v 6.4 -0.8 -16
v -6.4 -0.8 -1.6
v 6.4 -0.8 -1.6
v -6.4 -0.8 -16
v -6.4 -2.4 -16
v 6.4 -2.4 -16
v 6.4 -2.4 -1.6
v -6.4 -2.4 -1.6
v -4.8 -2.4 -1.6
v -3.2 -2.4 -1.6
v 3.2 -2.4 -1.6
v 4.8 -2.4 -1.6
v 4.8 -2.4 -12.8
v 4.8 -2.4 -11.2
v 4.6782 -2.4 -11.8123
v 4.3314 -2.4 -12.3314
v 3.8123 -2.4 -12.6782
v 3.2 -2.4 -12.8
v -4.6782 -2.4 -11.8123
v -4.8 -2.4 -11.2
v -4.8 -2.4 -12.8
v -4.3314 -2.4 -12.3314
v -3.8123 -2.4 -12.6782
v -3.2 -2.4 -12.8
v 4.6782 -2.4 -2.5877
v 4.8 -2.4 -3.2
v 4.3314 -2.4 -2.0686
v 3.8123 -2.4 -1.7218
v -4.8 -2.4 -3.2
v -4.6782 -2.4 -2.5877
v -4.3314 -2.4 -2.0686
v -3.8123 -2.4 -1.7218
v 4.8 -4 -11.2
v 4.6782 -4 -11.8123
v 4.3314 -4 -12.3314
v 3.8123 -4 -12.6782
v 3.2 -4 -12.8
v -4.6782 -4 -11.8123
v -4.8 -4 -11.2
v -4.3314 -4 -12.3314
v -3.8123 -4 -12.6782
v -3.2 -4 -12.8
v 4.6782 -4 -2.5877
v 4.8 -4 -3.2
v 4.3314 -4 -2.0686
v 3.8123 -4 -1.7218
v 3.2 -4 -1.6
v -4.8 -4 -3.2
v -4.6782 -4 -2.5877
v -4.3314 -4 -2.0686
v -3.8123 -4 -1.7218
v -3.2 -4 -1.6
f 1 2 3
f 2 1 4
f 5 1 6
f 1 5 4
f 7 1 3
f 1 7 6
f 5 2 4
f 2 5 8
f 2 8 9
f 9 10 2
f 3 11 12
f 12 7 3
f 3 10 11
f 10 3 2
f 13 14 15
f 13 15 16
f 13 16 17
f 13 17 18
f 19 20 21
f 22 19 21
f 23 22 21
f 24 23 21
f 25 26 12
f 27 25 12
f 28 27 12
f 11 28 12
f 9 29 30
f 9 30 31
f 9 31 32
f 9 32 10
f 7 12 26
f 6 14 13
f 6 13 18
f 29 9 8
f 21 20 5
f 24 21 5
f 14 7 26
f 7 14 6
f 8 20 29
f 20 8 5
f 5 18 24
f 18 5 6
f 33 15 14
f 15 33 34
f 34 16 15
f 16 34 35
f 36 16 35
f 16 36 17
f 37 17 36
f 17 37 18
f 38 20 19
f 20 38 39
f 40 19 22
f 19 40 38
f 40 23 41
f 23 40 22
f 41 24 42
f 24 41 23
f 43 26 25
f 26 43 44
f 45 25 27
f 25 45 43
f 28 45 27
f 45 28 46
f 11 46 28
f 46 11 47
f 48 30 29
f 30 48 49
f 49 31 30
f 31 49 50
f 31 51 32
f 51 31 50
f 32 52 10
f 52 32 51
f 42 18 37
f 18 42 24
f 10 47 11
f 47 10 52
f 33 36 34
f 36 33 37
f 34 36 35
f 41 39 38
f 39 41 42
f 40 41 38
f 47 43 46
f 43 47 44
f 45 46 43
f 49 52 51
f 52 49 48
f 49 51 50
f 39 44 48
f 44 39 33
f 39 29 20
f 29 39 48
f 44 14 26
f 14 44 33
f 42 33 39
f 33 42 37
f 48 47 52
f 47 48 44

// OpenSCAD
// file: ../p/1-4edge.scad
use <../lib.scad>
function ldraw_lib__1_4edge() = [
// 0 Circle 0.25
// 0 Name: 1-4edge.dat
// 0 Author: James Jessiman
// 0 !LDRAW_ORG Primitive UPDATE 2017-01
// 0 !LICENSE Licensed under CC BY 4.0 : see CAreadme.txt
// 
// 0 BFC CERTIFY CCW
  [0,"BFC","CERTIFY"],
  [0,"BFC","CCW"],
// 
// 0 !HISTORY 2007-06-22 [PTadmin] Header formatted for Contributor Agreement
// 0 !HISTORY 2008-07-01 [PTadmin] Official Update 2008-01
// 0 !HISTORY 2017-01-15 [Steffen] BFCed
// 0 !HISTORY 2017-12-30 [PTadmin] Official Update 2017-01
// 
// 
// 2 24 1 0 0 0.9239 0 0.3827
  [2,24,1,0,0,0.9239,0,0.3827],
// 2 24 0.9239 0 0.3827 0.7071 0 0.7071
  [2,24,0.9239,0,0.3827,0.7071,0,0.7071],
// 2 24 0.7071 0 0.7071 0.3827 0 0.9239
  [2,24,0.7071,0,0.7071,0.3827,0,0.9239],
// 2 24 0.3827 0 0.9239 0 0 1
  [2,24,0.3827,0,0.9239,0,0,1],
];
module ldraw_lib__1_4edge(step=0, col=false, unit=2/5, alt=false, line=0.2, solid=!$preview)
    makepoly(ldraw_lib__1_4edge(), step=step, col=col, unit=unit, alt=alt, line=line, solid=solid);
ldraw_lib__1_4edge(line=0.2);
// file: ../p/1-4cyli.scad
use <../lib.scad>
function ldraw_lib__1_4cyli() = [
// 0 Cylinder 0.25
// 0 Name: 1-4cyli.dat
// 0 Author: James Jessiman
// 0 !LDRAW_ORG Primitive UPDATE 2012-01
// 0 !LICENSE Licensed under CC BY 4.0 : see CAreadme.txt
// 
// 0 BFC CERTIFY CCW
  [0,"BFC","CERTIFY"],
  [0,"BFC","CCW"],
// 
// 0 !HISTORY 2002-03-23 [sbliss] Added BFC statement.
// 0 !HISTORY 2002-04-25 [PTadmin] Official Update 2002-02
// 0 !HISTORY 2007-06-22 [PTadmin] Header formatted for Contributor Agreement
// 0 !HISTORY 2008-07-01 [PTadmin] Official Update 2008-01
// 0 !HISTORY 2012-02-16 [Philo] Changed to CCW
// 0 !HISTORY 2012-03-30 [PTadmin] Official Update 2012-01
// 
// 
// 4 16 1 1 0 0.9239 1 0.3827 0.9239 0 0.3827 1 0 0
  [4,16,1,1,0,0.9239,1,0.3827,0.9239,0,0.3827,1,0,0],
// 5 24 1 0 0 1 1 0 0.9239 0 0.3827 1 0 -1
  [5,24,1,0,0,1,1,0,0.9239,0,0.3827,1,0,-1],
// 4 16 0.9239 1 0.3827 0.7071 1 0.7071 0.7071 0 0.7071 0.9239 0 0.3827
  [4,16,0.9239,1,0.3827,0.7071,1,0.7071,0.7071,0,0.7071,0.9239,0,0.3827],
// 5 24 0.9239 0 0.3827 0.9239 1 0.3827 0.7071 0 0.7071 1 0 0
  [5,24,0.9239,0,0.3827,0.9239,1,0.3827,0.7071,0,0.7071,1,0,0],
// 4 16 0.7071 1 0.7071 0.3827 1 0.9239 0.3827 0 0.9239 0.7071 0 0.7071
  [4,16,0.7071,1,0.7071,0.3827,1,0.9239,0.3827,0,0.9239,0.7071,0,0.7071],
// 5 24 0.7071 0 0.7071 0.7071 1 0.7071 0.3827 0 0.9239 0.9239 0 0.3827
  [5,24,0.7071,0,0.7071,0.7071,1,0.7071,0.3827,0,0.9239,0.9239,0,0.3827],
// 4 16 0.3827 1 0.9239 0 1 1 0 0 1 0.3827 0 0.9239
  [4,16,0.3827,1,0.9239,0,1,1,0,0,1,0.3827,0,0.9239],
// 5 24 0.3827 0 0.9239 0.3827 1 0.9239 0 0 1 0.7071 0 0.7071
  [5,24,0.3827,0,0.9239,0.3827,1,0.9239,0,0,1,0.7071,0,0.7071],
// 5 24 0 0 1 0 1 1 0.3827 0 0.9239 -1 0 1
  [5,24,0,0,1,0,1,1,0.3827,0,0.9239,-1,0,1],
];
module ldraw_lib__1_4cyli(step=0, col=false, unit=2/5, alt=false, line=0.2, solid=!$preview)
    makepoly(ldraw_lib__1_4cyli(), step=step, col=col, unit=unit, alt=alt, line=line, solid=solid);
ldraw_lib__1_4cyli(line=0.2);
// file: ../p/rect2p.scad
use <../lib.scad>
function ldraw_lib__rect2p() = [
// 0 Rectangle with 2 Parallel Edges
// 0 Name: rect2p.dat
// 0 Author: Donald Sutter [technog]
// 0 !LDRAW_ORG Primitive UPDATE 2010-01
// 0 !LICENSE Licensed under CC BY 4.0 : see CAreadme.txt
// 
// 0 BFC CERTIFY CCW
  [0,"BFC","CERTIFY"],
  [0,"BFC","CCW"],
// 
// 0 !HISTORY 2003-08-01 [PTadmin] Official Update 2003-02
// 0 !HISTORY 2007-06-24 [PTadmin] Header formatted for Contributor Agreement
// 0 !HISTORY 2008-07-01 [PTadmin] Official Update 2008-01
// 0 !HISTORY 2010-01-17 [mikeheide] changed winding to CCW
// 0 !HISTORY 2010-04-05 [PTadmin] Official Update 2010-01
// 
// 
// 2 24 1 0 1 -1 0 1
  [2,24,1,0,1,-1,0,1],
// 2 24 -1 0 -1 1 0 -1
  [2,24,-1,0,-1,1,0,-1],
// 4 16 -1 0 1 -1 0 -1 1 0 -1 1 0 1
  [4,16,-1,0,1,-1,0,-1,1,0,-1,1,0,1],
// 0
];
module ldraw_lib__rect2p(step=0, col=false, unit=2/5, alt=false, line=0.2, solid=!$preview)
    makepoly(ldraw_lib__rect2p(), step=step, col=col, unit=unit, alt=alt, line=line, solid=solid);
ldraw_lib__rect2p(line=0.2);
// file: ../p/rect1.scad
use <../lib.scad>
function ldraw_lib__rect1() = [
// 0 Rectangle with 1 Edge
// 0 Name: rect1.dat
// 0 Author: Chris Dee [cwdee]
// 0 !LDRAW_ORG Primitive UPDATE 2010-01
// 0 !LICENSE Licensed under CC BY 4.0 : see CAreadme.txt
// 
// 0 BFC CERTIFY CCW
  [0,"BFC","CERTIFY"],
  [0,"BFC","CCW"],
// 
// 0 !HISTORY 2003-12-19 [PTadmin] Official Update 2003-03
// 0 !HISTORY 2007-06-24 [PTadmin] Header formatted for Contributor Agreement
// 0 !HISTORY 2008-07-01 [PTadmin] Official Update 2008-01
// 0 !HISTORY 2010-01-17 [mikeheide] changed winding to CCW
// 0 !HISTORY 2010-04-05 [PTadmin] Official Update 2010-01
// 
// 
// 2 24 1 0 -1 1 0 1
  [2,24,1,0,-1,1,0,1],
// 4 16 -1 0 1 -1 0 -1 1 0 -1 1 0 1
  [4,16,-1,0,1,-1,0,-1,1,0,-1,1,0,1],
// 0
];
module ldraw_lib__rect1(step=0, col=false, unit=2/5, alt=false, line=0.2, solid=!$preview)
    makepoly(ldraw_lib__rect1(), step=step, col=col, unit=unit, alt=alt, line=line, solid=solid);
ldraw_lib__rect1(line=0.2);
// file: ../p/box4-1.scad
use <../lib.scad>
function ldraw_lib__box4_1() = [
// 0 Box with 4 Faces without 1 Edge
// 0 Name: box4-1.dat
// 0 Author: Tore Eriksson [Tore_Eriksson]
// 0 !LDRAW_ORG Primitive UPDATE 2012-01
// 0 !LICENSE Licensed under CC BY 2.0 and CC BY 4.0 : see CAreadme.txt
// 
// 0 BFC CERTIFY CCW
  [0,"BFC","CERTIFY"],
  [0,"BFC","CCW"],
// 
// 0 !HISTORY 1998-07-15 [PTadmin] Official Update 1998-07
// 0 !HISTORY 2002-04-05 [hafhead] Made BFC compliant
// 0 !HISTORY 2002-04-25 [PTadmin] Official Update 2002-02
// 0 !HISTORY 2007-06-24 [PTadmin] Header formatted for Contributor Agreement
// 0 !HISTORY 2008-07-01 [PTadmin] Official Update 2008-01
// 0 !HISTORY 2012-02-16 [Philo] Changed to CCW
// 0 !HISTORY 2012-03-30 [PTadmin] Official Update 2012-01
// 
// 
// 2 24 1 1 1 -1 1 1
  [2,24,1,1,1,-1,1,1],
// 2 24 -1 1 1 -1 1 -1
  [2,24,-1,1,1,-1,1,-1],
// 2 24 -1 1 -1 1 1 -1
  [2,24,-1,1,-1,1,1,-1],
// 2 24 1 1 -1 1 1 1
  [2,24,1,1,-1,1,1,1],
// 2 24 1 0 1 -1 0 1
  [2,24,1,0,1,-1,0,1],
// 2 24 -1 0 1 -1 0 -1
  [2,24,-1,0,1,-1,0,-1],
// 2 24 1 0 -1 1 0 1
  [2,24,1,0,-1,1,0,1],
// 2 24 1 0 1 1 1 1
  [2,24,1,0,1,1,1,1],
// 2 24 -1 0 1 -1 1 1
  [2,24,-1,0,1,-1,1,1],
// 2 24 1 0 -1 1 1 -1
  [2,24,1,0,-1,1,1,-1],
// 2 24 -1 0 -1 -1 1 -1
  [2,24,-1,0,-1,-1,1,-1],
// 4 16 -1 1 1 1 1 1 1 1 -1 -1 1 -1
  [4,16,-1,1,1,1,1,1,1,1,-1,-1,1,-1],
// 4 16 -1 1 1 -1 0 1 1 0 1 1 1 1
  [4,16,-1,1,1,-1,0,1,1,0,1,1,1,1],
// 4 16 -1 1 -1 -1 0 -1 -1 0 1 -1 1 1
  [4,16,-1,1,-1,-1,0,-1,-1,0,1,-1,1,1],
// 4 16 1 1 1 1 0 1 1 0 -1 1 1 -1
  [4,16,1,1,1,1,0,1,1,0,-1,1,1,-1],
];
module ldraw_lib__box4_1(step=0, col=false, unit=2/5, alt=false, line=0.2, solid=!$preview)
    makepoly(ldraw_lib__box4_1(), step=step, col=col, unit=unit, alt=alt, line=line, solid=solid);
ldraw_lib__box4_1(line=0.2);
// file: ../p/box3u8p.scad
use <../lib.scad>
function ldraw_lib__box3u8p() = [
// 0 Box with 3 Faces and 4 Parallel Edges
// 0 Name: box3u8p.dat
// 0 Author: James Jessiman
// 0 !LDRAW_ORG Primitive UPDATE 2012-01
// 0 !LICENSE Licensed under CC BY 2.0 and CC BY 4.0 : see CAreadme.txt
// 
// 0 BFC CERTIFY CCW
  [0,"BFC","CERTIFY"],
  [0,"BFC","CCW"],
// 
// 0 !HISTORY 2002-12-13 [hafhead] Made BFC compliant
// 0 !HISTORY 2003-08-01 [PTadmin] Official Update 2003-02
// 0 !HISTORY 2007-06-24 [PTadmin] Header formatted for Contributor Agreement
// 0 !HISTORY 2008-07-01 [PTadmin] Official Update 2008-01
// 0 !HISTORY 2012-02-16 [Philo] Changed to CCW
// 0 !HISTORY 2012-03-30 [PTadmin] Official Update 2012-01
// 
// 
// 2 24 1 1 1 -1 1 1
  [2,24,1,1,1,-1,1,1],
// 2 24 -1 1 -1 1 1 -1
  [2,24,-1,1,-1,1,1,-1],
// 2 24 1 0 1 -1 0 1
  [2,24,1,0,1,-1,0,1],
// 2 24 -1 0 -1 1 0 -1
  [2,24,-1,0,-1,1,0,-1],
// 4 16 1 1 -1 -1 1 -1 -1 1 1 1 1 1
  [4,16,1,1,-1,-1,1,-1,-1,1,1,1,1,1],
// 4 16 -1 1 1 -1 0 1 1 0 1 1 1 1
  [4,16,-1,1,1,-1,0,1,1,0,1,1,1,1],
// 4 16 1 1 -1 1 0 -1 -1 0 -1 -1 1 -1
  [4,16,1,1,-1,1,0,-1,-1,0,-1,-1,1,-1],
];
module ldraw_lib__box3u8p(step=0, col=false, unit=2/5, alt=false, line=0.2, solid=!$preview)
    makepoly(ldraw_lib__box3u8p(), step=step, col=col, unit=unit, alt=alt, line=line, solid=solid);
ldraw_lib__box3u8p(line=0.2);
// file: ../p/1-4ndis.scad
use <../lib.scad>
function ldraw_lib__1_4ndis() = [
// 0 Disc Negative 0.25
// 0 Name: 1-4ndis.dat
// 0 Author: James Jessiman
// 0 !LDRAW_ORG Primitive UPDATE 2012-01
// 0 !LICENSE Licensed under CC BY 4.0 : see CAreadme.txt
// 
// 0 BFC CERTIFY CCW
  [0,"BFC","CERTIFY"],
  [0,"BFC","CCW"],
// 
// 0 !HISTORY 2002-03-23 [sbliss] Added BFC Statement
// 0 !HISTORY 2002-04-25 [PTadmin] Official Update 2002-02
// 0 !HISTORY 2007-06-22 [PTadmin] Header formatted for Contributor Agreement
// 0 !HISTORY 2008-07-01 [PTadmin] Official Update 2008-01
// 0 !HISTORY 2012-02-16 [Philo] Changed to CCW
// 0 !HISTORY 2012-03-30 [PTadmin] Official Update 2012-01
// 
// 
// 3 16 0.9239 0 0.3827 1 0 0 1 0 1
  [3,16,0.9239,0,0.3827,1,0,0,1,0,1],
// 3 16 0.7071 0 0.7071 0.9239 0 0.3827 1 0 1
  [3,16,0.7071,0,0.7071,0.9239,0,0.3827,1,0,1],
// 3 16 0.3827 0 0.9239 0.7071 0 0.7071 1 0 1
  [3,16,0.3827,0,0.9239,0.7071,0,0.7071,1,0,1],
// 3 16 0 0 1 0.3827 0 0.9239 1 0 1
  [3,16,0,0,1,0.3827,0,0.9239,1,0,1],
];
module ldraw_lib__1_4ndis(step=0, col=false, unit=2/5, alt=false, line=0.2, solid=!$preview)
    makepoly(ldraw_lib__1_4ndis(), step=step, col=col, unit=unit, alt=alt, line=line, solid=solid);
ldraw_lib__1_4ndis(line=0.2);
// file: ../p/1-4cylo.scad
use <../lib.scad>
use <1-4cyli.scad>
use <1-4edge.scad>
function ldraw_lib__1_4cylo() = [
// 0 Cylinder Open 0.25
// 0 Name: 1-4cylo.dat
// 0 Author: Max Martin Richter [MMR1988]
// 0 !LDRAW_ORG Primitive UPDATE 2010-03
// 0 !LICENSE Licensed under CC BY 4.0 : see CAreadme.txt
// 
// 0 BFC CERTIFY CCW
  [0,"BFC","CERTIFY"],
  [0,"BFC","CCW"],
// 
// 0 !HISTORY 2010-12-31 [PTadmin] Official Update 2010-03
// 
// 
// 1 16 0 0 0 1 0 0 0 1 0 0 0 1 1-4edge.dat
  [1,16,0,0,0,1,0,0,0,1,0,0,0,1, ldraw_lib__1_4edge()],
// 1 16 0 1 0 1 0 0 0 1 0 0 0 1 1-4edge.dat
  [1,16,0,1,0,1,0,0,0,1,0,0,0,1, ldraw_lib__1_4edge()],
// 1 16 0 0 0 1 0 0 0 1 0 0 0 1 1-4cyli.dat
  [1,16,0,0,0,1,0,0,0,1,0,0,0,1, ldraw_lib__1_4cyli()],
];
module ldraw_lib__1_4cylo(step=0, col=false, unit=2/5, alt=false, line=0.2, solid=!$preview)
    makepoly(ldraw_lib__1_4cylo(), step=step, col=col, unit=unit, alt=alt, line=line, solid=solid);
ldraw_lib__1_4cylo(line=0.2);
// file: ../p/1-4chrd.scad
use <../lib.scad>
function ldraw_lib__1_4chrd() = [
// 0 Chord 0.25
// 0 Name: 1-4chrd.dat
// 0 Author: Tony Hafner [hafhead]
// 0 !LDRAW_ORG Primitive UPDATE 2012-02
// 0 !LICENSE Licensed under CC BY 2.0 and CC BY 4.0 : see CAreadme.txt
// 
// 0 BFC CERTIFY CCW
  [0,"BFC","CERTIFY"],
  [0,"BFC","CCW"],
// 
// 0 !HISTORY 2004-04-22 [PTadmin] Official Update 2004-02
// 0 !HISTORY 2007-10-09 [PTadmin] Header formatted for Contributor Agreement
// 0 !HISTORY 2008-07-01 [PTadmin] Official Update 2008-01
// 0 !HISTORY 2012-08-02 [MMR1988] Re-creation with PrimGen2 and Rectifier
// 0 !HISTORY 2012-08-09 [PTadmin] Official Update 2012-02
// 
// 
// 4 16 0.9239 0 0.3827 0.3827 0 0.9239 0 0 1 1 0 0
  [4,16,0.9239,0,0.3827,0.3827,0,0.9239,0,0,1,1,0,0],
// 3 16 0.7071 0 0.7071 0.3827 0 0.9239 0.9239 0 0.3827
  [3,16,0.7071,0,0.7071,0.3827,0,0.9239,0.9239,0,0.3827],
];
module ldraw_lib__1_4chrd(step=0, col=false, unit=2/5, alt=false, line=0.2, solid=!$preview)
    makepoly(ldraw_lib__1_4chrd(), step=step, col=col, unit=unit, alt=alt, line=line, solid=solid);
ldraw_lib__1_4chrd(line=0.2);
// main file
use <../lib.scad>
use <../p/1-4chrd.scad>
use <../p/1-4cylo.scad>
use <../p/1-4ndis.scad>
use <../p/box3u8p.scad>
use <../p/box4-1.scad>
use <../p/rect1.scad>
use <../p/rect2p.scad>
function ldraw_lib__4862() = [
// 0 Glass for Window  1 x  2 x  2 Plane
// 0 Name: 4862.dat
// 0 Author: James Jessiman
// 0 !LDRAW_ORG Part UPDATE 2018-02
// 0 !LICENSE Licensed under CC BY 4.0 : see CAreadme.txt
// 
// 0 BFC CERTIFY CCW
  [0,"BFC","CERTIFY"],
  [0,"BFC","CCW"],
// 
// 0 !HISTORY 1999-02-01 [PTadmin] Official Update 1999-01
// 0 !HISTORY 2007-07-09 [PTadmin] Header formatted for Contributor Agreement
// 0 !HISTORY 2008-07-01 [PTadmin] Official Update 2008-01
// 0 !HISTORY 2014-11-09 [MagFors] BFCed, primitive substitution
// 0 !HISTORY 2014-12-23 [PTadmin] Official Update 2014-02
// 0 !HISTORY 2018-01-27 [Steffen] fixed singular matrices
// 0 !HISTORY 2018-12-08 [PTadmin] Official Update 2018-02
// 
// 
// 2 24 -16 4 -6 -12 4 -6
  [2,24,-16,4,-6,-12,4,-6],
// 2 24 -12 4 -6 -8 4 -6
  [2,24,-12,4,-6,-8,4,-6],
// 2 24 8 4 -6 12 4 -6
  [2,24,8,4,-6,12,4,-6],
// 2 24 12 4 -6 16 4 -6
  [2,24,12,4,-6,16,4,-6],
// 1 16 0 22 -6 -16 0 0 0 0 18 0 4 0 box4-1.dat
  [1,16,0,22,-6,-16,0,0,0,0,18,0,4,0, ldraw_lib__box4_1()],
// 3 16 -16 4 -2 -16 4 -6 -12 4 -6
  [3,16,-16,4,-2,-16,4,-6,-12,4,-6],
// 3 16 -12 4 -6 -8 4 -6 -16 4 -2
  [3,16,-12,4,-6,-8,4,-6,-16,4,-2],
// 3 16 16 4 -2 8 4 -6 12 4 -6
  [3,16,16,4,-2,8,4,-6,12,4,-6],
// 3 16 12 4 -6 16 4 -6 16 4 -2
  [3,16,12,4,-6,16,4,-6,16,4,-2],
// 4 16 -16 4 -2 -8 4 -6 8 4 -6 16 4 -2
  [4,16,-16,4,-2,-8,4,-6,8,4,-6,16,4,-2],
// 1 16 8 28 -6 4 0 0 0 0 4 0 1 0 1-4ndis.dat
  [1,16,8,28,-6,4,0,0,0,0,4,0,1,0, ldraw_lib__1_4ndis()],
// 1 16 -8 28 -6 -4 0 0 0 0 4 0 1 0 1-4ndis.dat
  [1,16,-8,28,-6,-4,0,0,0,0,4,0,1,0, ldraw_lib__1_4ndis()],
// 1 16 8 8 -6 4 0 0 0 0 -4 0 1 0 1-4ndis.dat
  [1,16,8,8,-6,4,0,0,0,0,-4,0,1,0, ldraw_lib__1_4ndis()],
// 1 16 -8 8 -6 -4 0 0 0 0 -4 0 1 0 1-4ndis.dat
  [1,16,-8,8,-6,-4,0,0,0,0,-4,0,1,0, ldraw_lib__1_4ndis()],
// 3 16 16 4 -6 12 4 -6 12 8 -6
  [3,16,16,4,-6,12,4,-6,12,8,-6],
// 3 16 16 40 -6 12 28 -6 12 32 -6
  [3,16,16,40,-6,12,28,-6,12,32,-6],
// 3 16 16 40 -6 12 32 -6 8 32 -6
  [3,16,16,40,-6,12,32,-6,8,32,-6],
// 3 16 -12 8 -6 -12 4 -6 -16 4 -6
  [3,16,-12,8,-6,-12,4,-6,-16,4,-6],
// 3 16 -12 32 -6 -12 28 -6 -16 40 -6
  [3,16,-12,32,-6,-12,28,-6,-16,40,-6],
// 3 16 -8 32 -6 -12 32 -6 -16 40 -6
  [3,16,-8,32,-6,-12,32,-6,-16,40,-6],
// 4 16 16 4 -6 12 8 -6 12 28 -6 16 40 -6
  [4,16,16,4,-6,12,8,-6,12,28,-6,16,40,-6],
// 4 16 -16 40 -6 -12 28 -6 -12 8 -6 -16 4 -6
  [4,16,-16,40,-6,-12,28,-6,-12,8,-6,-16,4,-6],
// 4 16 16 40 -6 8 32 -6 -8 32 -6 -16 40 -6
  [4,16,16,40,-6,8,32,-6,-8,32,-6,-16,40,-6],
// 1 16 8 28 -10 4 0 0 0 0 4 0 4 0 1-4cylo.dat
  [1,16,8,28,-10,4,0,0,0,0,4,0,4,0, ldraw_lib__1_4cylo()],
// 1 16 -8 28 -10 -4 0 0 0 0 4 0 4 0 1-4cylo.dat
  [1,16,-8,28,-10,-4,0,0,0,0,4,0,4,0, ldraw_lib__1_4cylo()],
// 1 16 8 8 -10 4 0 0 0 0 -4 0 4 0 1-4cylo.dat
  [1,16,8,8,-10,4,0,0,0,0,-4,0,4,0, ldraw_lib__1_4cylo()],
// 1 16 -8 8 -10 -4 0 0 0 0 -4 0 4 0 1-4cylo.dat
  [1,16,-8,8,-10,-4,0,0,0,0,-4,0,4,0, ldraw_lib__1_4cylo()],
// 1 16 0 32 -8 -8 0 0 0 -1 0 0 0 2 rect2p.dat
  [1,16,0,32,-8,-8,0,0,0,-1,0,0,0,2, ldraw_lib__rect2p()],
// 1 16 0 4 -8 0 0 8 0 1 0 -2 0 0 rect1.dat
  [1,16,0,4,-8,0,0,8,0,1,0,-2,0,0, ldraw_lib__rect1()],
// 1 16 8 28 -10 4 0 0 0 0 4 0 1 0 1-4chrd.dat
  [1,16,8,28,-10,4,0,0,0,0,4,0,1,0, ldraw_lib__1_4chrd()],
// 1 16 -8 28 -10 -4 0 0 0 0 4 0 1 0 1-4chrd.dat
  [1,16,-8,28,-10,-4,0,0,0,0,4,0,1,0, ldraw_lib__1_4chrd()],
// 1 16 8 8 -10 4 0 0 0 0 -4 0 1 0 1-4chrd.dat
  [1,16,8,8,-10,4,0,0,0,0,-4,0,1,0, ldraw_lib__1_4chrd()],
// 1 16 -8 8 -10 -4 0 0 0 0 -4 0 1 0 1-4chrd.dat
  [1,16,-8,8,-10,-4,0,0,0,0,-4,0,1,0, ldraw_lib__1_4chrd()],
// 1 16 0 18 -6 0 0 -12 10 0 0 0 -4 0 box3u8p.dat
  [1,16,0,18,-6,0,0,-12,10,0,0,0,-4,0, ldraw_lib__box3u8p()],
// 4 16 8 32 -10 12 28 -10 -12 28 -10 -8 32 -10
  [4,16,8,32,-10,12,28,-10,-12,28,-10,-8,32,-10],
// 4 16 12 8 -10 8 4 -10 -8 4 -10 -12 8 -10
  [4,16,12,8,-10,8,4,-10,-8,4,-10,-12,8,-10],
];
module ldraw_lib__4862(step=0, col=false, unit=2/5, alt=false, line=0.2, solid=!$preview)
    makepoly(ldraw_lib__4862(), step=step, col=col, unit=unit, alt=alt, line=line, solid=solid);
ldraw_lib__4862(line=0.2);
